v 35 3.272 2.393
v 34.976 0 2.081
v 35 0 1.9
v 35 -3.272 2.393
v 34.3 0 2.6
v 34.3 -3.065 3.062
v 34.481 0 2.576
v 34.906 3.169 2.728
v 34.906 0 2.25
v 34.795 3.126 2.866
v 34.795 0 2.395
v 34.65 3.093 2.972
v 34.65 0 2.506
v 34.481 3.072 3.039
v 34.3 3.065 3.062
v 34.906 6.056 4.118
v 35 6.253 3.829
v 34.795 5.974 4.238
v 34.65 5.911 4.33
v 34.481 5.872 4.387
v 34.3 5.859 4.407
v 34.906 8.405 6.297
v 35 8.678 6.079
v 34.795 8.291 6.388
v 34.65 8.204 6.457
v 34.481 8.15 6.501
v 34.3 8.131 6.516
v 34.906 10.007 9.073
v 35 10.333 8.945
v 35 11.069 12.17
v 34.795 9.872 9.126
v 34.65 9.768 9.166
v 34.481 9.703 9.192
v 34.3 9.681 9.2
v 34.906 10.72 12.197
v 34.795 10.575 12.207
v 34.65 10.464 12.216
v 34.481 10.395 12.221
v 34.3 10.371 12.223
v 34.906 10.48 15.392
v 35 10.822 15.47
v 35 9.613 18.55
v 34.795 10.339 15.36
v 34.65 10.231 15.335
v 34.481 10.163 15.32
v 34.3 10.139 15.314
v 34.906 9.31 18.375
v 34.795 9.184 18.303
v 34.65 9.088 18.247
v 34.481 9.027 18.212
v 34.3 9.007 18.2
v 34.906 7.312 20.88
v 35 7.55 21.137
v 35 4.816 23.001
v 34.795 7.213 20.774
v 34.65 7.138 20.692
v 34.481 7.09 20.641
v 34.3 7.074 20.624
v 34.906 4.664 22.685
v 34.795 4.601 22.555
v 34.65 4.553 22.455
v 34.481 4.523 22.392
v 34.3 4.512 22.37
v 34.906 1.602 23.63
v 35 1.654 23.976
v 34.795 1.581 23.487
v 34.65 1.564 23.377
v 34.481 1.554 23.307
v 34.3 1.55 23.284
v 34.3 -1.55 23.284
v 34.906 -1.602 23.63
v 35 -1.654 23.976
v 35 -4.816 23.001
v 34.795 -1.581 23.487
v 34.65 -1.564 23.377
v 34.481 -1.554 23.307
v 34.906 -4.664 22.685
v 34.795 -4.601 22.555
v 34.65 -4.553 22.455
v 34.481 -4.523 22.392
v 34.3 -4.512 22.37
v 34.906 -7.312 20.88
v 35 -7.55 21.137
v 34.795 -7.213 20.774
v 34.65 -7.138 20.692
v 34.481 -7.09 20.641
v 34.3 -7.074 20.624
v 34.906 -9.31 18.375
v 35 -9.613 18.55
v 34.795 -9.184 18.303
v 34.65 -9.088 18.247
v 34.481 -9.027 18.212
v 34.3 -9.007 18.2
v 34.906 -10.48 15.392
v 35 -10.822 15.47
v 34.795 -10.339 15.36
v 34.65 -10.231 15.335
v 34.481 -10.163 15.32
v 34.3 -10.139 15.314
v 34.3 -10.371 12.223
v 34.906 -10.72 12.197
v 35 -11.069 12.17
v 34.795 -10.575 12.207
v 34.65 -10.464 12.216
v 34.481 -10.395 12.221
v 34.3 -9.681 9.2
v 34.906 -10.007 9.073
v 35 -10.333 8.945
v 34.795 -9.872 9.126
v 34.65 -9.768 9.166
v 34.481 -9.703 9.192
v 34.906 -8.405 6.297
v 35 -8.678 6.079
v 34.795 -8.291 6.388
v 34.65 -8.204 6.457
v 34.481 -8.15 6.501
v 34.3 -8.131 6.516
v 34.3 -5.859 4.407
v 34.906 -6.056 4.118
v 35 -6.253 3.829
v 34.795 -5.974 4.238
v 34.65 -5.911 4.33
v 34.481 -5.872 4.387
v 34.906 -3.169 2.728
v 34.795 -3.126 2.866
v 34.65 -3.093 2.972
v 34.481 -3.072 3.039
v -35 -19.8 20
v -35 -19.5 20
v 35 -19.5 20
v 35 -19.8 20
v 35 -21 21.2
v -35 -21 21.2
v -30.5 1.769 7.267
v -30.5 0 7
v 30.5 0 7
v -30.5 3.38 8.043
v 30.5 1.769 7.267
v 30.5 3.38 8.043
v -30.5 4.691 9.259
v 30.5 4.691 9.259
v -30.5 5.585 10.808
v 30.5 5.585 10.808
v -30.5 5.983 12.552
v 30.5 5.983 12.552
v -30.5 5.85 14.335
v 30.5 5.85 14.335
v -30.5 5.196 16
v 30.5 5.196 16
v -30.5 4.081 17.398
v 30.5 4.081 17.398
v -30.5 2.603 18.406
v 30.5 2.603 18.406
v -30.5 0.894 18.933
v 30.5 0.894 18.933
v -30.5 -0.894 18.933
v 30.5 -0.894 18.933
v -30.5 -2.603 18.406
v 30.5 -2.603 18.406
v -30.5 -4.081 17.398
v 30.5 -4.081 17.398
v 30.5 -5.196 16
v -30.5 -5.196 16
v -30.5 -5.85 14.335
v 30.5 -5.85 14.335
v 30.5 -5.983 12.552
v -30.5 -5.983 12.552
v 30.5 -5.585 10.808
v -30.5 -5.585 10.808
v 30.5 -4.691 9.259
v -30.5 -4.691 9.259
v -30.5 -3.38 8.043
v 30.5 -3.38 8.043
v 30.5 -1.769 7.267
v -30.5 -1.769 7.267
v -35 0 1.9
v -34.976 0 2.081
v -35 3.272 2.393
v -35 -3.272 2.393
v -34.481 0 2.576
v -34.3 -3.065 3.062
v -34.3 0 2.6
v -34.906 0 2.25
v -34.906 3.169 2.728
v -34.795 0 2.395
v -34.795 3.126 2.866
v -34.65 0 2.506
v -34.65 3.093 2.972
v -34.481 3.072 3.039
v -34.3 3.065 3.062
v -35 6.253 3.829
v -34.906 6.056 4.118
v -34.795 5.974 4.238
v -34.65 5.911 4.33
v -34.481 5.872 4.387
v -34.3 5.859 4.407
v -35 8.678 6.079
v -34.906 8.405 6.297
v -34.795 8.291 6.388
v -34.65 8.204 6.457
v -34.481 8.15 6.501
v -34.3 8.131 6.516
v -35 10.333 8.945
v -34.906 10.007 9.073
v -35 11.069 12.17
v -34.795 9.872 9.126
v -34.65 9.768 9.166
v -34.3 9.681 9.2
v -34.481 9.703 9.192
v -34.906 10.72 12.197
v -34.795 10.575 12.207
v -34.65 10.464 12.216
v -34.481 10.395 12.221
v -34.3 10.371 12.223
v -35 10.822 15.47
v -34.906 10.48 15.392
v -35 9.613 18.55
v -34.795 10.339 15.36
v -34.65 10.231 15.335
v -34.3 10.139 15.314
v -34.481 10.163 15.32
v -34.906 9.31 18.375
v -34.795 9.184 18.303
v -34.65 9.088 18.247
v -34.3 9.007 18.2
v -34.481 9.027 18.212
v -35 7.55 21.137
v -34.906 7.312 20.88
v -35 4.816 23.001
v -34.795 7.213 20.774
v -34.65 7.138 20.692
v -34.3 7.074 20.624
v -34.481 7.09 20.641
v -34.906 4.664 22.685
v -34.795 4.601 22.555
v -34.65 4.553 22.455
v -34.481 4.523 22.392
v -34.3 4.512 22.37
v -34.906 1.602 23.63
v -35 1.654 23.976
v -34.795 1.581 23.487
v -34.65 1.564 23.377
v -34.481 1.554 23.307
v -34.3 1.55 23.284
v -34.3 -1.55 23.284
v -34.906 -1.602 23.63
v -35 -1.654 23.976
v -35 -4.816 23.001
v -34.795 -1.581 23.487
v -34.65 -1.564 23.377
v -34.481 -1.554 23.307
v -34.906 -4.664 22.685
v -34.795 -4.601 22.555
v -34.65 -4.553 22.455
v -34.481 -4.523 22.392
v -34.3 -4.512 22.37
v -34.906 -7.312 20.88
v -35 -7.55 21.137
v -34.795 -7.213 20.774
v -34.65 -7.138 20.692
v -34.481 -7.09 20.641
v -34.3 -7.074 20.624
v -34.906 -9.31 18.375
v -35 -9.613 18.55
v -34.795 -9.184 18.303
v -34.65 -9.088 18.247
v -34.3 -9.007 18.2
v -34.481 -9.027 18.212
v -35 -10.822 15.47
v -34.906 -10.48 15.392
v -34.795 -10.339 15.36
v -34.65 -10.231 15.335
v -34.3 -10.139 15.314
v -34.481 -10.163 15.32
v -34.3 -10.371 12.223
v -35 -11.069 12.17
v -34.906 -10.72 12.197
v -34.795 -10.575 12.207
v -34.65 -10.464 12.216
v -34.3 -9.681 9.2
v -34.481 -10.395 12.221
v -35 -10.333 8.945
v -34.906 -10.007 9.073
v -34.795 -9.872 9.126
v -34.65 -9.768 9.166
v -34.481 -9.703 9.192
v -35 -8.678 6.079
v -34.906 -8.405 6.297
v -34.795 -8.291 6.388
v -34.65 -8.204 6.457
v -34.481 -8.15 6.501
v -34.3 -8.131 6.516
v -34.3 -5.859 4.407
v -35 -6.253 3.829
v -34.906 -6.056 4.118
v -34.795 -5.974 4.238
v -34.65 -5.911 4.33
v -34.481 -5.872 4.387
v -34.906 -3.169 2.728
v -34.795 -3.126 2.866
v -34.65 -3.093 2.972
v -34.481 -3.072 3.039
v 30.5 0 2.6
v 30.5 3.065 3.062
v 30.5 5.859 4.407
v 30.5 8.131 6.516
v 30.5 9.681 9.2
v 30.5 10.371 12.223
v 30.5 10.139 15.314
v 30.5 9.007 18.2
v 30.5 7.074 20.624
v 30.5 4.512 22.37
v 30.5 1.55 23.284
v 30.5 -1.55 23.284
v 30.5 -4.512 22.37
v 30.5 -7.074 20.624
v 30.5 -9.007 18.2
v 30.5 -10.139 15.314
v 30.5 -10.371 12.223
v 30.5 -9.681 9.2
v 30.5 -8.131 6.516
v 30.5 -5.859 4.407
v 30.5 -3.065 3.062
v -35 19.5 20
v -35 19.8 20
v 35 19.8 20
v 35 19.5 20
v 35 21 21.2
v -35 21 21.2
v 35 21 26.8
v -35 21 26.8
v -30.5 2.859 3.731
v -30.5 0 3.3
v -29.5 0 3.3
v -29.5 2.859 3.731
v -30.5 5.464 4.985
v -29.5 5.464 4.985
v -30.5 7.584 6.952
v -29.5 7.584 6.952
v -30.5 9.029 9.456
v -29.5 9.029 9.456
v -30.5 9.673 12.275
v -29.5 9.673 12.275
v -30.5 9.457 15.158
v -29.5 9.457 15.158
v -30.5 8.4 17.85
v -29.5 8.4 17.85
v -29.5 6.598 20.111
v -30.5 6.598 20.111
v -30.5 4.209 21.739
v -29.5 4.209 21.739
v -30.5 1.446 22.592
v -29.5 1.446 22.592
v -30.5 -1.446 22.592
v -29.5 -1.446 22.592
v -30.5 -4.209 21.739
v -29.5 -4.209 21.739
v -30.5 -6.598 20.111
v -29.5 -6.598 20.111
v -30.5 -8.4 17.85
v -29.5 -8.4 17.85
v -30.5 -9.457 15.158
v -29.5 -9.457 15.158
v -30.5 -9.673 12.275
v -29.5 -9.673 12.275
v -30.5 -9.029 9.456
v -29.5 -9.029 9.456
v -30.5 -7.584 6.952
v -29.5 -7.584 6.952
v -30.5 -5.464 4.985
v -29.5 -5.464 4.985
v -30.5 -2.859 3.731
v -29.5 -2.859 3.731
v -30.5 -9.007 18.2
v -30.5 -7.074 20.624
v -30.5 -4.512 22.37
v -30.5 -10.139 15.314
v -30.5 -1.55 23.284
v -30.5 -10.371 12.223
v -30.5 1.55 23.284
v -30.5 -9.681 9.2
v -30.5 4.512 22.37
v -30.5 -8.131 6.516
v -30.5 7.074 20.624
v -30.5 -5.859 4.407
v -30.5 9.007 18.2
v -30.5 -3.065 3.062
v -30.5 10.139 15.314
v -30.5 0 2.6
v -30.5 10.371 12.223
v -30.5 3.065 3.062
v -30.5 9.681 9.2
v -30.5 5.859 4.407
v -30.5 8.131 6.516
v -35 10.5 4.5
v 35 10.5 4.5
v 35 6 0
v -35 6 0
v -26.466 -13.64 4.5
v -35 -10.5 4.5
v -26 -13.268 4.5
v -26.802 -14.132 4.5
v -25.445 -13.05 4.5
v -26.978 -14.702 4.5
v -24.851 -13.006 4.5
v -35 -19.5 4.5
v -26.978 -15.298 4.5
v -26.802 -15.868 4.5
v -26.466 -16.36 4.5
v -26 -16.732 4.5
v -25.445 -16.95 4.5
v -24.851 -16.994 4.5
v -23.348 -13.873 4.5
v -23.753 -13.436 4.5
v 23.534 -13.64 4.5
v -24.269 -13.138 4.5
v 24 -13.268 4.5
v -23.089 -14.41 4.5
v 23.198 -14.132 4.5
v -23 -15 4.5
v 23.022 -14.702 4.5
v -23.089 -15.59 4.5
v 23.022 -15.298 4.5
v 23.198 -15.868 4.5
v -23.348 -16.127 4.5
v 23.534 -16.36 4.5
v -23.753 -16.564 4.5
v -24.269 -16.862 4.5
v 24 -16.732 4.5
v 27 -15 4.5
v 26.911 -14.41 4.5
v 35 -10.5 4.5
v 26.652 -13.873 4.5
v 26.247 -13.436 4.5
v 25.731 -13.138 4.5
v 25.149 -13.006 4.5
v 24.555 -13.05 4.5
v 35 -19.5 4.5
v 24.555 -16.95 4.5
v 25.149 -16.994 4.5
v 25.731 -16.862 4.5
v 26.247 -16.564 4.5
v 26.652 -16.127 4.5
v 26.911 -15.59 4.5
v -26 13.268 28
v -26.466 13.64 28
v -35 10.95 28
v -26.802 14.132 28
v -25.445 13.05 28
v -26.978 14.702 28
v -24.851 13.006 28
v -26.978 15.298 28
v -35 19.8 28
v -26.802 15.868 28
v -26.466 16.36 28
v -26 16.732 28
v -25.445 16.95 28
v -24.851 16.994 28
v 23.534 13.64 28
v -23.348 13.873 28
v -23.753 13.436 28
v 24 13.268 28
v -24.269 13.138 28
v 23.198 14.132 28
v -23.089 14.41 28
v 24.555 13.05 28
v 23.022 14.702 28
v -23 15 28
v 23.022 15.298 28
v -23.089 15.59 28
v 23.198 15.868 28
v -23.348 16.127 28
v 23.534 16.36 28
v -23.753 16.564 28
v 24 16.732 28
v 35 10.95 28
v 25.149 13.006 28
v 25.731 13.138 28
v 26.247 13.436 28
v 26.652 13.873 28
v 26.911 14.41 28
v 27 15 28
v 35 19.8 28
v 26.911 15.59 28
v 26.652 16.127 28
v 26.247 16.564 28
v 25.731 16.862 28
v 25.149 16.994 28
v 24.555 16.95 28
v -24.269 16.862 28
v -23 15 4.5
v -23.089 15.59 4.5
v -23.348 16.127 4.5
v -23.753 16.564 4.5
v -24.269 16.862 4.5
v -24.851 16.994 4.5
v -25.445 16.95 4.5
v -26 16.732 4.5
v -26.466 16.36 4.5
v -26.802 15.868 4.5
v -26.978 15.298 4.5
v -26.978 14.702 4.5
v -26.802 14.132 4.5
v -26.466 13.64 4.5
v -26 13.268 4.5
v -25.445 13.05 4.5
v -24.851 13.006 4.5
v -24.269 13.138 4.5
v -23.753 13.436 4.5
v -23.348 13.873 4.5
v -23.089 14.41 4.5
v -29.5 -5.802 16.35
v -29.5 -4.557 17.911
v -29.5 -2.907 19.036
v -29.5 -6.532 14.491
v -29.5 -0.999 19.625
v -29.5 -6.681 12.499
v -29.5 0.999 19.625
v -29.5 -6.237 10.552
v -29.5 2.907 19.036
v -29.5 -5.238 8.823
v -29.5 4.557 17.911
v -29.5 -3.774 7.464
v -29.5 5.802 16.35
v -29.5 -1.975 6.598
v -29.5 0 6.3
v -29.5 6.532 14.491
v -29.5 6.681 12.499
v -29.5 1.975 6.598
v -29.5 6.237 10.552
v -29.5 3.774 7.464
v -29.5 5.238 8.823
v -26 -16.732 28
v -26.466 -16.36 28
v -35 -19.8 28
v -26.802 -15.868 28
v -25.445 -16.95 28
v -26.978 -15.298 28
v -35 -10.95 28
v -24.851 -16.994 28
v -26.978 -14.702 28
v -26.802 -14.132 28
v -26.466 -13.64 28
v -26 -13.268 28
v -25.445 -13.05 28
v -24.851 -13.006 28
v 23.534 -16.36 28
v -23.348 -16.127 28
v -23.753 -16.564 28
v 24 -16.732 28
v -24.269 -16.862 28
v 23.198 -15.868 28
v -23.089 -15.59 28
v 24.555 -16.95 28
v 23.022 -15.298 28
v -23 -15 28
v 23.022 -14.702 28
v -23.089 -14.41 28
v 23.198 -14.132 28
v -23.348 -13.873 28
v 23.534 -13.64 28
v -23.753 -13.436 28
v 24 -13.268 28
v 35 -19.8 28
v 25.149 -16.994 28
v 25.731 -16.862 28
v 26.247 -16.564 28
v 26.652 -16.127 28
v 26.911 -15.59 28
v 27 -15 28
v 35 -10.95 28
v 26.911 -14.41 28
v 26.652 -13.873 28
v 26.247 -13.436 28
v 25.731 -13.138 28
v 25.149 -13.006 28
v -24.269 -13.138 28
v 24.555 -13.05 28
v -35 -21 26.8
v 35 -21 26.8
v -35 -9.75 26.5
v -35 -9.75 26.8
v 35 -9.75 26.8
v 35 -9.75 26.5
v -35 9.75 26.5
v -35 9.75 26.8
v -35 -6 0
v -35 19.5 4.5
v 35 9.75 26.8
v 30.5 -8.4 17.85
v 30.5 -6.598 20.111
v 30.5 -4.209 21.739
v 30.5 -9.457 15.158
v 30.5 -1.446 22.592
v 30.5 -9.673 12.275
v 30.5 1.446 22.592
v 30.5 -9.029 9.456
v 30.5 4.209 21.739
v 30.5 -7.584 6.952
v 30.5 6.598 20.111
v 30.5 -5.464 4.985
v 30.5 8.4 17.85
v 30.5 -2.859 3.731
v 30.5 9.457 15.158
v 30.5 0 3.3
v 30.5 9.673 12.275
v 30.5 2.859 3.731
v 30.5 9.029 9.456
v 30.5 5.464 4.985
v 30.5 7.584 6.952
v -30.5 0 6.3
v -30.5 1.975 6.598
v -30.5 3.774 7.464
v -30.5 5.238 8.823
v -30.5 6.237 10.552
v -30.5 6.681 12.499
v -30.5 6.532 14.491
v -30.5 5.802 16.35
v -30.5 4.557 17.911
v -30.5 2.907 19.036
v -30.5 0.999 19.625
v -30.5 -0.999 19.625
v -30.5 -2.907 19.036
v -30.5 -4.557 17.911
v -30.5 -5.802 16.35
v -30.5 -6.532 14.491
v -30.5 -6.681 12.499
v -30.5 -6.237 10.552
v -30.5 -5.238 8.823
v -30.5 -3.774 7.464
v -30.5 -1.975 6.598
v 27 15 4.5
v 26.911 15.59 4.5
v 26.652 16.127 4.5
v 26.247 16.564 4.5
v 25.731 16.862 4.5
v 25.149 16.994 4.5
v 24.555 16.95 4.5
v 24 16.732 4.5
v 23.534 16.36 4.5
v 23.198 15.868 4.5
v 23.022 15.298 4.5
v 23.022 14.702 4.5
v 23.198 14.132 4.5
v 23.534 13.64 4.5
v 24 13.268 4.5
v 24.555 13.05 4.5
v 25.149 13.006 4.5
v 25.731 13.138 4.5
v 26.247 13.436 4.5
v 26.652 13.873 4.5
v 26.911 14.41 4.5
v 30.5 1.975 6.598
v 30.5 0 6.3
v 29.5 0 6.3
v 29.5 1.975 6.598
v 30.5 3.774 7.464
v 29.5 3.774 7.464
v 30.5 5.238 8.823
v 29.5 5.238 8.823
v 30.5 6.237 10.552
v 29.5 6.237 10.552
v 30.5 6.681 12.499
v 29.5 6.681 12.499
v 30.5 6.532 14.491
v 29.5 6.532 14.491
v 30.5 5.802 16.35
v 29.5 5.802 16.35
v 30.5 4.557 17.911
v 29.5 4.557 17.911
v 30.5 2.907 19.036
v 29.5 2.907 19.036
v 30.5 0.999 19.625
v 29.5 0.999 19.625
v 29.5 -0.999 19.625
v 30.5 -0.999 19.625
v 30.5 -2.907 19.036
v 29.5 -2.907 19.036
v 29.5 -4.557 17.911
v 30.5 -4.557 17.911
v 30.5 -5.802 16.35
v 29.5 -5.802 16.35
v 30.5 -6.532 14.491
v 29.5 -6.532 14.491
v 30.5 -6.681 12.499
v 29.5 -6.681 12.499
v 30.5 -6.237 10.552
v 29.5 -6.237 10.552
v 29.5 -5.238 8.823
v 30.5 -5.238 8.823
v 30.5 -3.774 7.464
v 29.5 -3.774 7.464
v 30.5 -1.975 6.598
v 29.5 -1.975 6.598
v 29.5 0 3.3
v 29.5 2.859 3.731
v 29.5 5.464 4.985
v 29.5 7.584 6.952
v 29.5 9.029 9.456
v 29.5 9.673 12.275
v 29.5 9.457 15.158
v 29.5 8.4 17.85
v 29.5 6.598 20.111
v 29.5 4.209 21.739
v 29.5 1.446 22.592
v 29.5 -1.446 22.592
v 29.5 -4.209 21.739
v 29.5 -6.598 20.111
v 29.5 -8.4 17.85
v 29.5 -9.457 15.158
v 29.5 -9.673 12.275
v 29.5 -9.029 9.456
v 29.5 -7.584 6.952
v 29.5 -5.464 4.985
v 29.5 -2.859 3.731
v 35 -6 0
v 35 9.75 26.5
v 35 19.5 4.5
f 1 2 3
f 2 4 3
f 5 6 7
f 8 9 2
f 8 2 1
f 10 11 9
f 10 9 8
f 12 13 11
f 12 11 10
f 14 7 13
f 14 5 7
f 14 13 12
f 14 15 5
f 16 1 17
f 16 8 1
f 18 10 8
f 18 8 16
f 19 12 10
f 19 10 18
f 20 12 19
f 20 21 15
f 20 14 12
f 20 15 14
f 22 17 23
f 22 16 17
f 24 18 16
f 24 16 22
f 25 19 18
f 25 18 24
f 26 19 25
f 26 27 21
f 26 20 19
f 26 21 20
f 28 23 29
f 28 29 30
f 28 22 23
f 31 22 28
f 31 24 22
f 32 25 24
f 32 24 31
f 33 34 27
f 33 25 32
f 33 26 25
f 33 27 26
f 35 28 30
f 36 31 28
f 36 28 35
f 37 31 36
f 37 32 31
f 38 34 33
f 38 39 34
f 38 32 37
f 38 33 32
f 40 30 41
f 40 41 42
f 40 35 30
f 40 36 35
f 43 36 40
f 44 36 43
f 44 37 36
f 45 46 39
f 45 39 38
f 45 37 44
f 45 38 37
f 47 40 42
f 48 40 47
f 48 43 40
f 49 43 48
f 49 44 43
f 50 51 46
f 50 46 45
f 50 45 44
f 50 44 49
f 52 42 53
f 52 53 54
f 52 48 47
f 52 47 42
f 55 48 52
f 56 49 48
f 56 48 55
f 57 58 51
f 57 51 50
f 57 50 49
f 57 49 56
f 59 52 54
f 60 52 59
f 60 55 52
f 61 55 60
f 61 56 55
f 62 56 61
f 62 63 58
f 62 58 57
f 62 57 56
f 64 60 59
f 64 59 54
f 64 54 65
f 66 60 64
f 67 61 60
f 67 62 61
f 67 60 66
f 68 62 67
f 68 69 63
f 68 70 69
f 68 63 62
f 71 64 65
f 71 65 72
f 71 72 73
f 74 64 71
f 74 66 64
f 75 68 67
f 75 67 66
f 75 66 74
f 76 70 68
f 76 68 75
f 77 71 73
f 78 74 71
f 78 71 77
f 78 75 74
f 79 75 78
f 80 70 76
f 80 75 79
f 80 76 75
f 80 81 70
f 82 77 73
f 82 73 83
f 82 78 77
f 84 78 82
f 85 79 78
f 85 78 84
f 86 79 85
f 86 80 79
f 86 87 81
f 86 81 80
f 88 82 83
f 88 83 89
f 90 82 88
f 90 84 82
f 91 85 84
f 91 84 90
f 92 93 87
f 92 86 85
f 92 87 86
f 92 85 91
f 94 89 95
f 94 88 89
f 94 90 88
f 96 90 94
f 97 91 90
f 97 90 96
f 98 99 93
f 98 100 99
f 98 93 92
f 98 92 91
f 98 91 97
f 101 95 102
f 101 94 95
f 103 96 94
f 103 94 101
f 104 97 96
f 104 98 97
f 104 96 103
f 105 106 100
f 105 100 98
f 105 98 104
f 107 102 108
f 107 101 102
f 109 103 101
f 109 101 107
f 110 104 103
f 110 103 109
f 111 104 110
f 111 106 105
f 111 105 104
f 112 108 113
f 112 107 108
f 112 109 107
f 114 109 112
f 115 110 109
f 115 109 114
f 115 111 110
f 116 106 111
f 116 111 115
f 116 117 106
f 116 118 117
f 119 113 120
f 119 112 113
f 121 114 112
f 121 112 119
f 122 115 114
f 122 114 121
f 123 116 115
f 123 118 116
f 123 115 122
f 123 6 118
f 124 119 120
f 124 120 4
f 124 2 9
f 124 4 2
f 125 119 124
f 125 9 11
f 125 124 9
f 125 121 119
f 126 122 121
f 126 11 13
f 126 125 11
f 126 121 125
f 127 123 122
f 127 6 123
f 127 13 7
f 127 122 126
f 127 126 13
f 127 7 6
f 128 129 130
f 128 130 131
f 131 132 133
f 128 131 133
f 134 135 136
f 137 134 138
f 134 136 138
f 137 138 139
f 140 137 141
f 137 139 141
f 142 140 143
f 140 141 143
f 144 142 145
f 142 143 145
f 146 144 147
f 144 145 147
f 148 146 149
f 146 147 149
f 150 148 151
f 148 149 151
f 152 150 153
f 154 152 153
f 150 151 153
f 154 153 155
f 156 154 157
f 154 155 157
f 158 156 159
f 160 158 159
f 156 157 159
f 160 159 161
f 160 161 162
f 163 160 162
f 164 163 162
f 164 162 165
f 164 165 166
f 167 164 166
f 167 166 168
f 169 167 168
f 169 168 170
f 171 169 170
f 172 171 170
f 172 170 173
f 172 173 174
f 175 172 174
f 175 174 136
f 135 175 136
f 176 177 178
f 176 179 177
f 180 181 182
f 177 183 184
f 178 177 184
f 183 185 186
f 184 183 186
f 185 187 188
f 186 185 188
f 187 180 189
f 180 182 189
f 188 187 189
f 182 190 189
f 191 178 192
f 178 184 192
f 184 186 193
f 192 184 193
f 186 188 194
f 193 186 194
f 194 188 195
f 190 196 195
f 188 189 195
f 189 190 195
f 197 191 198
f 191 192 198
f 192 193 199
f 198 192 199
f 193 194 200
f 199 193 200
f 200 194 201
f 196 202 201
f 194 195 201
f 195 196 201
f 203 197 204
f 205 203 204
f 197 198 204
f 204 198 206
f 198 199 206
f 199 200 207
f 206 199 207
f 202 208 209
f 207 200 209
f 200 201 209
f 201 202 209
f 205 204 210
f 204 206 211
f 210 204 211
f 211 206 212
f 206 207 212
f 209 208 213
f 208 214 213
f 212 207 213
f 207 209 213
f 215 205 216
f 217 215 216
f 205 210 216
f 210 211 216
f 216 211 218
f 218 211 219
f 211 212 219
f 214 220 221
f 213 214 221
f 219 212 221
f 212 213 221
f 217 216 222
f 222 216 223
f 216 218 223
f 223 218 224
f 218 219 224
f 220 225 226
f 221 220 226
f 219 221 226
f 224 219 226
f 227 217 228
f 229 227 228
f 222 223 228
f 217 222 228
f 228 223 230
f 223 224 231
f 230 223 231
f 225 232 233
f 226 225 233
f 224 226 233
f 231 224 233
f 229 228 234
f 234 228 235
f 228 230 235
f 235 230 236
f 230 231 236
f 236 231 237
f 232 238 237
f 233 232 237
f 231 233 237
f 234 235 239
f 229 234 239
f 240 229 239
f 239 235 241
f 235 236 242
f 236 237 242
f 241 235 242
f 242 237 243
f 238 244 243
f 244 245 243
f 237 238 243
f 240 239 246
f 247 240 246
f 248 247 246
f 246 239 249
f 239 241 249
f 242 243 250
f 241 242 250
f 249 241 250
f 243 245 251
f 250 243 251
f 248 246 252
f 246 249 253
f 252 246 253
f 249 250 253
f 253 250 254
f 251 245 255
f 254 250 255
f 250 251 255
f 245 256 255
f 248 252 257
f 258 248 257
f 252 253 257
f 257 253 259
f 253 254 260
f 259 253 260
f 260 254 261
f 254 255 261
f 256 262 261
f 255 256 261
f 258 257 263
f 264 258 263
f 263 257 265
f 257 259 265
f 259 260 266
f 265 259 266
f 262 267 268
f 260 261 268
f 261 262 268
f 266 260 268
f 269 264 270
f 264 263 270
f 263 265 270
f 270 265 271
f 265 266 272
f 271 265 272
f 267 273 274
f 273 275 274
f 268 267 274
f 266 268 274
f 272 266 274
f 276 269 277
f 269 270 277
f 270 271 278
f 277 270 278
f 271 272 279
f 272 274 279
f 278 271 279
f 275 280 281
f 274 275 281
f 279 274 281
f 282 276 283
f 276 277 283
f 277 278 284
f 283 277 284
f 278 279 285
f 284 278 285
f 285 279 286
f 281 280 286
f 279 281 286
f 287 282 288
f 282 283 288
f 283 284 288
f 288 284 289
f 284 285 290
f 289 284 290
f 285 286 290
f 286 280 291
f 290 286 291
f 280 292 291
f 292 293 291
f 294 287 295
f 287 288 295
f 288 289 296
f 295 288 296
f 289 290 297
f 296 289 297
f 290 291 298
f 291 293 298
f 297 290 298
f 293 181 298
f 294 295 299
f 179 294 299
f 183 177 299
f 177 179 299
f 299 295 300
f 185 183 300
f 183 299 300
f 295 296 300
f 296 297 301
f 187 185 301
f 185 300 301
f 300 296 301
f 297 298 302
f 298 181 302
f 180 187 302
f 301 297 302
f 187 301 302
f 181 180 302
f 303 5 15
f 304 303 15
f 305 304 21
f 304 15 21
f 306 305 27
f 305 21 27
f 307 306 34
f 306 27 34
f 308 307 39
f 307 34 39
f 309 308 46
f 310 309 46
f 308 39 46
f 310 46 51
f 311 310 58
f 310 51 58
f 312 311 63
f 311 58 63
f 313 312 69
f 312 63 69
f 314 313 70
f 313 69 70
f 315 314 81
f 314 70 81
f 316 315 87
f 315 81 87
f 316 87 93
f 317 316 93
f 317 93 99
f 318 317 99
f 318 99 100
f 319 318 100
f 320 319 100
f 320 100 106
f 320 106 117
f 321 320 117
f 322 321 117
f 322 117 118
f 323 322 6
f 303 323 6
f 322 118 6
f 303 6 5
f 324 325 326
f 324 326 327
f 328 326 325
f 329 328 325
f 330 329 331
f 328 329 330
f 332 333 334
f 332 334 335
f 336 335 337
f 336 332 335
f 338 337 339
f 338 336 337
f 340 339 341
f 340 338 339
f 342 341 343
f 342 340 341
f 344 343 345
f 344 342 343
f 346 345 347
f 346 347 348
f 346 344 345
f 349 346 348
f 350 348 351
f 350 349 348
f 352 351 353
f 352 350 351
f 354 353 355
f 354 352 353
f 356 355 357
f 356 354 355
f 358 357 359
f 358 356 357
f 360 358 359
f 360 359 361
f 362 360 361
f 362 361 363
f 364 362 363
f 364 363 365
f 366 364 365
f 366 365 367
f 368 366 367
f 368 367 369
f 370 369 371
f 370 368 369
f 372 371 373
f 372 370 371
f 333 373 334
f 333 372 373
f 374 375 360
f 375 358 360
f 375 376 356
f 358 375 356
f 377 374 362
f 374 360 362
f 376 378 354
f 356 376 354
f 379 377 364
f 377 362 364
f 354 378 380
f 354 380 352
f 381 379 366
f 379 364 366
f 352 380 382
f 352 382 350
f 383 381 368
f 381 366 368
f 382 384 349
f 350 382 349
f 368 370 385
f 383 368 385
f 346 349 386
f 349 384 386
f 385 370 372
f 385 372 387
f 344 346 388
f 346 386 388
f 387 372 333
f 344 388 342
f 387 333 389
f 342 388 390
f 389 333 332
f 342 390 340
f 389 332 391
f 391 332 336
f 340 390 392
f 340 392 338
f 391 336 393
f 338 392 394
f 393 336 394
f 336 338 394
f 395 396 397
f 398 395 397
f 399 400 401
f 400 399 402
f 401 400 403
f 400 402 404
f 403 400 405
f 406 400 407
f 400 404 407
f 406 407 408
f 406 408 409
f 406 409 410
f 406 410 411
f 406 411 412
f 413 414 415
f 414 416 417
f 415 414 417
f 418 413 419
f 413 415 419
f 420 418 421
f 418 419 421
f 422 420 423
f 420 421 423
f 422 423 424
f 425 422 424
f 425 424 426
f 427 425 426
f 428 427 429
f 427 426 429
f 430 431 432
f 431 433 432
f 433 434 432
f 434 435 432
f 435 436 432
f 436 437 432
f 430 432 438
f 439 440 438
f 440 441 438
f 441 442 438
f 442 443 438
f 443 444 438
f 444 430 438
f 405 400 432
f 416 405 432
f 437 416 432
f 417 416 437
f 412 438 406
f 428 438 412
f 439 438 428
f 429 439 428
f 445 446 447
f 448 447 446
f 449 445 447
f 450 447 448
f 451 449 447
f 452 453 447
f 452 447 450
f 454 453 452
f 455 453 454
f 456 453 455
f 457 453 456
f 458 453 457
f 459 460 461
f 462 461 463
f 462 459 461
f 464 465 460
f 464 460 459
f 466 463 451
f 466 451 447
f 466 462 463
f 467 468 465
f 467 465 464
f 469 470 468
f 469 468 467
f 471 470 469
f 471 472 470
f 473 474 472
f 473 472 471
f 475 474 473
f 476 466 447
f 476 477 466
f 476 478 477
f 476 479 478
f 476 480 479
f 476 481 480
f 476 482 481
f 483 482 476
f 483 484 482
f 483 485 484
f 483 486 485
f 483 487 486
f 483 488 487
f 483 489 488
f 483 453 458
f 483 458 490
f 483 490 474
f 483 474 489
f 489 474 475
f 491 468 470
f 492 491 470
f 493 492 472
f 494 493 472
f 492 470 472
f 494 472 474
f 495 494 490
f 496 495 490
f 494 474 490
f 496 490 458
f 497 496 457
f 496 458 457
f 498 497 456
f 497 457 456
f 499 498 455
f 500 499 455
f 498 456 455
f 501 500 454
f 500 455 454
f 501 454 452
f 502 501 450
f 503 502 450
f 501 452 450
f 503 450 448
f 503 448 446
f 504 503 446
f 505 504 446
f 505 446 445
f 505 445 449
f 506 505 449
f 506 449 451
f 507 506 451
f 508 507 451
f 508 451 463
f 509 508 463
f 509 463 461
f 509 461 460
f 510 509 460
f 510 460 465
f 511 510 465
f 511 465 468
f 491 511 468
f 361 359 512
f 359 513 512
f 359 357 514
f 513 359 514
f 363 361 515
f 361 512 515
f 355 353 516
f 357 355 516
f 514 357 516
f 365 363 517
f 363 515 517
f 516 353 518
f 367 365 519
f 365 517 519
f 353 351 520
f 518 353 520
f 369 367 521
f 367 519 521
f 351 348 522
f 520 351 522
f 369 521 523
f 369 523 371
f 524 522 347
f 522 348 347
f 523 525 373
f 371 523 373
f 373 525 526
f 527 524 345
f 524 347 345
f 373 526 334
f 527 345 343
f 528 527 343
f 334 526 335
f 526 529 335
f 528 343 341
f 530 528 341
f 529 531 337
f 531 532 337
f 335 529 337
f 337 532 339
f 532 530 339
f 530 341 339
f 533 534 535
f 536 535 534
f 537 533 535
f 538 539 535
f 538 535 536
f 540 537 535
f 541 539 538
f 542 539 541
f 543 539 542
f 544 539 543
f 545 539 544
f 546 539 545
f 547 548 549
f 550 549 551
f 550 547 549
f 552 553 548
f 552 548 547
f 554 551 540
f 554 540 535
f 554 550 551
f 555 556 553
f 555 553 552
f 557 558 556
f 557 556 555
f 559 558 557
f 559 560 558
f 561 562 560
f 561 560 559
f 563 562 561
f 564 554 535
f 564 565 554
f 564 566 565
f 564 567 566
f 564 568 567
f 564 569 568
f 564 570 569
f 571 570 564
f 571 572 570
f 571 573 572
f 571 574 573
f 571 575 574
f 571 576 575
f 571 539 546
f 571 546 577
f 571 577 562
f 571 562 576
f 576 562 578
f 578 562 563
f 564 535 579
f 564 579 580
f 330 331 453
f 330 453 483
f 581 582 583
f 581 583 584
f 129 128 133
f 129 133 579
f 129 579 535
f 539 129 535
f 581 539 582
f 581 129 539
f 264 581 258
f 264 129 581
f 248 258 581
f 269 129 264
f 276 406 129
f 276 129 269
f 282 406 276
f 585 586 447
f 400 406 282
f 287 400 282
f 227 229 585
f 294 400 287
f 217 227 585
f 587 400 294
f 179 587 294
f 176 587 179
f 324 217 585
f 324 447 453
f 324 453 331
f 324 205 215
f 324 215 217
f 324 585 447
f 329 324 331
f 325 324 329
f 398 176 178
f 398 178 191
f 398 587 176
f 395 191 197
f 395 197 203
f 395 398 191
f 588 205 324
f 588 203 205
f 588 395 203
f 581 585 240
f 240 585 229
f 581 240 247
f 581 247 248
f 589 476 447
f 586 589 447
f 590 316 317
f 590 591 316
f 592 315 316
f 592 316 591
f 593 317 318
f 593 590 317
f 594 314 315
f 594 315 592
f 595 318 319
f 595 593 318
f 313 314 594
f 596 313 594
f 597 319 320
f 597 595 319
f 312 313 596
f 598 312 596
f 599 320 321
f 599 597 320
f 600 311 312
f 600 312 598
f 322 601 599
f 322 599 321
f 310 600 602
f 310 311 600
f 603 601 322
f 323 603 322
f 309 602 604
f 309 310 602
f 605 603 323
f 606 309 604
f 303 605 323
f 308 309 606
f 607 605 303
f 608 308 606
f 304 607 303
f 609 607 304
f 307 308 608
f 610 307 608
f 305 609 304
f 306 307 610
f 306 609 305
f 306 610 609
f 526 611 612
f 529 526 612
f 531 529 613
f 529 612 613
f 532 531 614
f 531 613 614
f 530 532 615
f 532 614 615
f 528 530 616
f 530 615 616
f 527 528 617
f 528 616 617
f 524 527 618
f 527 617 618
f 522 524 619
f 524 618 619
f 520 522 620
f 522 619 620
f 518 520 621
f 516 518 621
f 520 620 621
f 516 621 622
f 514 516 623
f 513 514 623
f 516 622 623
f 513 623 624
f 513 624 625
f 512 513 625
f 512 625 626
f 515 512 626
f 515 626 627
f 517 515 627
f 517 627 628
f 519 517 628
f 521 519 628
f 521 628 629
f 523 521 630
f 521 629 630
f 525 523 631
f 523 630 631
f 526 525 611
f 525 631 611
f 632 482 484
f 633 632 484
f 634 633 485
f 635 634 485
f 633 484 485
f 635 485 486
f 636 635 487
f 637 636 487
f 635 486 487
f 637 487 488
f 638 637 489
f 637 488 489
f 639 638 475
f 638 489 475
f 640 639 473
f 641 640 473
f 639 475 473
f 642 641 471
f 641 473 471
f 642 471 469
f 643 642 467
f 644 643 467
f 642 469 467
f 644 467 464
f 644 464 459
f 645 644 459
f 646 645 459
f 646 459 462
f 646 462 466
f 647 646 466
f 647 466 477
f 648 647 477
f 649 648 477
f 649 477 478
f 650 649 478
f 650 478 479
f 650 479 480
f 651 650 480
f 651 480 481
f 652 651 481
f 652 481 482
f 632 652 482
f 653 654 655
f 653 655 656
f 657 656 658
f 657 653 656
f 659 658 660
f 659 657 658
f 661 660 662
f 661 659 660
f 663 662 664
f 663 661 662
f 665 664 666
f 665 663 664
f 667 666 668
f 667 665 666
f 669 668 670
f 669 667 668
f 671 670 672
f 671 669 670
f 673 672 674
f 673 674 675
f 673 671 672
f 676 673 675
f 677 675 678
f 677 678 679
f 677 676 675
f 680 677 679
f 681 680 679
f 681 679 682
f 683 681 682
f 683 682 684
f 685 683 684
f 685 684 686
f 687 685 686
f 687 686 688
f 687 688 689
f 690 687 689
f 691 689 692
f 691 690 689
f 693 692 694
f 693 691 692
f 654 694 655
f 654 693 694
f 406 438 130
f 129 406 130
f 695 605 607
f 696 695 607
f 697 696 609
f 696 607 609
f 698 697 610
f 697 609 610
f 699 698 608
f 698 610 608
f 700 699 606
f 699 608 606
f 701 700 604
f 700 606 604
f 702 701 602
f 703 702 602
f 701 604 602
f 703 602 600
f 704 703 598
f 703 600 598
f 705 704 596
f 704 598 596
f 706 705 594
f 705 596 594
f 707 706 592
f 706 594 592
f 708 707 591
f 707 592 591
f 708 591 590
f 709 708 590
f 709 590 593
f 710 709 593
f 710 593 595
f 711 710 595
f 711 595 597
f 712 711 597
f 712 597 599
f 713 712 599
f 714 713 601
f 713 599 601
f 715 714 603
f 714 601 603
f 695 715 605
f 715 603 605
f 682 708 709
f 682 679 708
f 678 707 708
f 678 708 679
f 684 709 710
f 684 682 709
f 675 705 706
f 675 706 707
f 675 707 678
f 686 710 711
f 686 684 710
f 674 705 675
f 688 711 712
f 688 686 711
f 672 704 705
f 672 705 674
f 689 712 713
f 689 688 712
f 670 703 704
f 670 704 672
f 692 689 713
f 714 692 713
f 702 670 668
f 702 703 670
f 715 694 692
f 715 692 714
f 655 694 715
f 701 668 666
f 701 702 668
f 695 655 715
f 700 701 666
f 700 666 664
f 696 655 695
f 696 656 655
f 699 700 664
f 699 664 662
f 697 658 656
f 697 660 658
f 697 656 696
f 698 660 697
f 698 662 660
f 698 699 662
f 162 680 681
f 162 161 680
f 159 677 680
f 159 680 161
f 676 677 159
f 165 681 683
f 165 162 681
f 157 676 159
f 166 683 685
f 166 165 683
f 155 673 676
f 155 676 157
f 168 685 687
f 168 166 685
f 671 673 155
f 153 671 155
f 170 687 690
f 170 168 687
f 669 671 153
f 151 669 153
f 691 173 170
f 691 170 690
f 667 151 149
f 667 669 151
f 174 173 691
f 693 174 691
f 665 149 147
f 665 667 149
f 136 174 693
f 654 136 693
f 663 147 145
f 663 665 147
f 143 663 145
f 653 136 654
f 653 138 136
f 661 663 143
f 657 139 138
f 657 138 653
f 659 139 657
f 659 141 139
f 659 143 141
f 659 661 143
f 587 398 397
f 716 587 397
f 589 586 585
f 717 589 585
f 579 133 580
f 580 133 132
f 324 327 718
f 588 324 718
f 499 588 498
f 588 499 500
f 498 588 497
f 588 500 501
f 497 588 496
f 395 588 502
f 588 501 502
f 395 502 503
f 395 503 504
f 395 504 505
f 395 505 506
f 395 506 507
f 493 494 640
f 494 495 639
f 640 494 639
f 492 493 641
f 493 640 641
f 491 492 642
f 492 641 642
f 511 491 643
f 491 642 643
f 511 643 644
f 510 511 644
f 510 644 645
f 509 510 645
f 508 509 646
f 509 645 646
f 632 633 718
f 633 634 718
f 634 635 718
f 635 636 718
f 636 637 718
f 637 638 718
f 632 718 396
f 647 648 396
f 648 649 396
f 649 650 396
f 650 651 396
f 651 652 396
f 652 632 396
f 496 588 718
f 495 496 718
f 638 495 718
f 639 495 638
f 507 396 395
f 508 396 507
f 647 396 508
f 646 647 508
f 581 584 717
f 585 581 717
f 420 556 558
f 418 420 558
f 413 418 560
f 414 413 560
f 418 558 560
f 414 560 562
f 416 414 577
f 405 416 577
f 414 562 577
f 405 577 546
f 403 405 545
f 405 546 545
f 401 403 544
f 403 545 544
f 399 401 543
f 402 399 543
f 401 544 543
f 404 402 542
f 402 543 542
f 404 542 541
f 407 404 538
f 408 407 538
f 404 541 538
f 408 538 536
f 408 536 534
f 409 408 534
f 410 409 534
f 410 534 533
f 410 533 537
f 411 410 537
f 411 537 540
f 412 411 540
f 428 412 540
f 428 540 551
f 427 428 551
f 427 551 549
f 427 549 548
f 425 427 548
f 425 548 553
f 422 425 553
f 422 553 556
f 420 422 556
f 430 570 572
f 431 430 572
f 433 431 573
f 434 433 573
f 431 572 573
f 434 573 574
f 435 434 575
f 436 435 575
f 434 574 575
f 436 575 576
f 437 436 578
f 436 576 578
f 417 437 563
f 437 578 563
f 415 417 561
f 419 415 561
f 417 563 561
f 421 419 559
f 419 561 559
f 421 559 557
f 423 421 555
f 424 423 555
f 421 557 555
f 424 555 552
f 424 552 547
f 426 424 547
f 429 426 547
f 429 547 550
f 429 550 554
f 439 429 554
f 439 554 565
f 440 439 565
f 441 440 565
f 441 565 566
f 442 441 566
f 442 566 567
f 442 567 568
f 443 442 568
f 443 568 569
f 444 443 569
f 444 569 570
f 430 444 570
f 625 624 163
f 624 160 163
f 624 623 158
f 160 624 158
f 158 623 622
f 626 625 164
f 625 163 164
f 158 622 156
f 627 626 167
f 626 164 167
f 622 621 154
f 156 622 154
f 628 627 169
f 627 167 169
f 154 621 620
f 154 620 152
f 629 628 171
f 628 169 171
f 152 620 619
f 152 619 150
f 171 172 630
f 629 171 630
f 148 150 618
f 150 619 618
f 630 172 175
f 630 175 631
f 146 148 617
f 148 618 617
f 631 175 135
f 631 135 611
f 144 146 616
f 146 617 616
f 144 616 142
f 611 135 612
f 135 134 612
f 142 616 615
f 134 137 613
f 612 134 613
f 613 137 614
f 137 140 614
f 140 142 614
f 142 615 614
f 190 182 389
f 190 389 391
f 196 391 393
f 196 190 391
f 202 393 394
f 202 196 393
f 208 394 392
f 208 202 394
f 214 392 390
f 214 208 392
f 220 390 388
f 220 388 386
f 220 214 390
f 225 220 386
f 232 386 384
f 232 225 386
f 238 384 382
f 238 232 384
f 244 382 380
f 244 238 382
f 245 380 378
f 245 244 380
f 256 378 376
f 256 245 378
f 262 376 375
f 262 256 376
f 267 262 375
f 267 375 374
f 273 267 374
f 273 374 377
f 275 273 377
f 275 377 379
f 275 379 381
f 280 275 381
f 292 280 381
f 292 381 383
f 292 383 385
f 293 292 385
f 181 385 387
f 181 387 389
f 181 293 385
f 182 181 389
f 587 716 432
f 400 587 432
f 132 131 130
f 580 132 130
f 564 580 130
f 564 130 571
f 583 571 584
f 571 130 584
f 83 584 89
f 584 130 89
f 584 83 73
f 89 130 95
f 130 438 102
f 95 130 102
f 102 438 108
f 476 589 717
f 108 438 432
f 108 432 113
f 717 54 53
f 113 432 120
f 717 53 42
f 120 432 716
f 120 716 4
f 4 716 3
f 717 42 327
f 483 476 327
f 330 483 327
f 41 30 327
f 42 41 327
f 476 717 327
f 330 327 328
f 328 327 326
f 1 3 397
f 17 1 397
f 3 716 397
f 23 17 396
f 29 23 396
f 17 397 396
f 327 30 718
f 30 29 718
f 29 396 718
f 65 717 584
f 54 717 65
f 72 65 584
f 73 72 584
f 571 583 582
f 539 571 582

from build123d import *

# Parameters (mm, degrees)
CROQUIS1_W              = 70
CROQUIS1_H              = 42
SALIENTE_EXTRUIR1_DEPTH = 28
CROQUIS2_W              = 1.5
CROQUIS2_H              = 19.5
CORTAR_EXTRUIR1_DEPTH   = 70
CROQUIS3_R              = 2
CORTAR_EXTRUIR2_DEPTH   = 70
CROQUIS4_R              = 6
CORTAR_EXTRUIR3_DEPTH   = 70
CROQUIS5_R              = 10.4
CORTAR_EXTRUIR4_DEPTH   = 4.5
CROQUIS6_R              = 9.7
CROQUIS6_R_2            = 6.7
CORTAR_EXTRUIR5_DEPTH   = 1
CHAFL_N1_SIZE           = 1.2
REDONDEO1_R             = 0.7


with BuildPart() as part:
    # Croquis1 → Saliente-Extruir1 (new body)
    with BuildSketch(Plane.XY):
        Rectangle(CROQUIS1_W, CROQUIS1_H)
    extrude(amount=SALIENTE_EXTRUIR1_DEPTH)

    # Croquis2 → Cortar-Extruir1 (cut)
    with BuildSketch(Plane(origin=(35, 0, 0), x_dir=(0, 0, -1), z_dir=(1, 0, 0))):
        with Locations((-27.25, 0)):
            Rectangle(CROQUIS2_W, CROQUIS2_H)
        Polygon((0, 21), (-20, 21), (-20, 19.5), (-4.5, 19.5), (-4.5, 10.5), (0, 6), align=None)
        Polygon((-20, -19.5), (-20, -21), (0, -21), (0, -6), (-4.5, -10.5), (-4.5, -19.5), align=None)
    extrude(amount=-CORTAR_EXTRUIR1_DEPTH, mode=Mode.SUBTRACT)

    # Croquis3 → Cortar-Extruir2 (cut)
    with BuildSketch(Plane.XY.offset(28)):
        with Locations((25, -15)):
            Circle(CROQUIS3_R)
        with Locations((-25, -15)):
            Circle(CROQUIS3_R)
        with Locations((-25, 15)):
            Circle(CROQUIS3_R)
        with Locations((25, 15)):
            Circle(CROQUIS3_R)
    extrude(amount=-CORTAR_EXTRUIR2_DEPTH, mode=Mode.SUBTRACT)

    # Croquis4 → Cortar-Extruir3 (cut)
    with BuildSketch(Plane(origin=(35, 0, 0), x_dir=(0, 0, -1), z_dir=(1, 0, 0))):
        with Locations((-13, 0)):
            Circle(CROQUIS4_R)
    extrude(amount=-CORTAR_EXTRUIR3_DEPTH, mode=Mode.SUBTRACT)

    # Croquis5 → Cortar-Extruir4 (cut)
    with BuildSketch(Plane(origin=(35, 0, 0), x_dir=(0, 0, -1), z_dir=(1, 0, 0))):
        with Locations((-13, 0)):
            Circle(CROQUIS5_R)
    cortar_extruir4 = extrude(amount=-CORTAR_EXTRUIR4_DEPTH, mode=Mode.SUBTRACT)

    # Croquis6 → Cortar-Extruir5 (cut)
    with BuildSketch(Plane(origin=(30.5, 0, 0), x_dir=(0, 0, -1), z_dir=(1, 0, 0))):
        with Locations((-13, 0)):
            Circle(CROQUIS6_R)
        with Locations((-13, 0)):
            Circle(CROQUIS6_R_2, mode=Mode.SUBTRACT)
    cortar_extruir5 = extrude(amount=-CORTAR_EXTRUIR5_DEPTH, mode=Mode.SUBTRACT)

    # Simetría1: Cortar-Extruir4, Cortar-Extruir5 across plane
    add(cortar_extruir4.mirror(Plane(origin=(0, 0, 0), x_dir=(0, 0, 1), z_dir=(1, 0, 0))), mode=Mode.SUBTRACT)
    add(cortar_extruir5.mirror(Plane(origin=(0, 0, 0), x_dir=(0, 0, 1), z_dir=(1, 0, 0))), mode=Mode.SUBTRACT)

    # Chaflán1
    chafl_n1_edges = [part.edges().sort_by_distance(p)[0] for p in [
        (0, -21, 28),
        (0, -9.75, 28),
        (0, 9.75, 28),
        (0, 21, 20),
        (0, -21, 20),
        (0, 21, 28),
    ]]
    chamfer(chafl_n1_edges, length=CHAFL_N1_SIZE)

    # Redondeo1
    redondeo1_edges = [part.edges().sort_by_distance(p)[0] for p in [
        (-35, 0, 23.4),
        (35, 0, 23.4),
    ]]
    fillet(redondeo1_edges, radius=REDONDEO1_R)


solid = part.part
